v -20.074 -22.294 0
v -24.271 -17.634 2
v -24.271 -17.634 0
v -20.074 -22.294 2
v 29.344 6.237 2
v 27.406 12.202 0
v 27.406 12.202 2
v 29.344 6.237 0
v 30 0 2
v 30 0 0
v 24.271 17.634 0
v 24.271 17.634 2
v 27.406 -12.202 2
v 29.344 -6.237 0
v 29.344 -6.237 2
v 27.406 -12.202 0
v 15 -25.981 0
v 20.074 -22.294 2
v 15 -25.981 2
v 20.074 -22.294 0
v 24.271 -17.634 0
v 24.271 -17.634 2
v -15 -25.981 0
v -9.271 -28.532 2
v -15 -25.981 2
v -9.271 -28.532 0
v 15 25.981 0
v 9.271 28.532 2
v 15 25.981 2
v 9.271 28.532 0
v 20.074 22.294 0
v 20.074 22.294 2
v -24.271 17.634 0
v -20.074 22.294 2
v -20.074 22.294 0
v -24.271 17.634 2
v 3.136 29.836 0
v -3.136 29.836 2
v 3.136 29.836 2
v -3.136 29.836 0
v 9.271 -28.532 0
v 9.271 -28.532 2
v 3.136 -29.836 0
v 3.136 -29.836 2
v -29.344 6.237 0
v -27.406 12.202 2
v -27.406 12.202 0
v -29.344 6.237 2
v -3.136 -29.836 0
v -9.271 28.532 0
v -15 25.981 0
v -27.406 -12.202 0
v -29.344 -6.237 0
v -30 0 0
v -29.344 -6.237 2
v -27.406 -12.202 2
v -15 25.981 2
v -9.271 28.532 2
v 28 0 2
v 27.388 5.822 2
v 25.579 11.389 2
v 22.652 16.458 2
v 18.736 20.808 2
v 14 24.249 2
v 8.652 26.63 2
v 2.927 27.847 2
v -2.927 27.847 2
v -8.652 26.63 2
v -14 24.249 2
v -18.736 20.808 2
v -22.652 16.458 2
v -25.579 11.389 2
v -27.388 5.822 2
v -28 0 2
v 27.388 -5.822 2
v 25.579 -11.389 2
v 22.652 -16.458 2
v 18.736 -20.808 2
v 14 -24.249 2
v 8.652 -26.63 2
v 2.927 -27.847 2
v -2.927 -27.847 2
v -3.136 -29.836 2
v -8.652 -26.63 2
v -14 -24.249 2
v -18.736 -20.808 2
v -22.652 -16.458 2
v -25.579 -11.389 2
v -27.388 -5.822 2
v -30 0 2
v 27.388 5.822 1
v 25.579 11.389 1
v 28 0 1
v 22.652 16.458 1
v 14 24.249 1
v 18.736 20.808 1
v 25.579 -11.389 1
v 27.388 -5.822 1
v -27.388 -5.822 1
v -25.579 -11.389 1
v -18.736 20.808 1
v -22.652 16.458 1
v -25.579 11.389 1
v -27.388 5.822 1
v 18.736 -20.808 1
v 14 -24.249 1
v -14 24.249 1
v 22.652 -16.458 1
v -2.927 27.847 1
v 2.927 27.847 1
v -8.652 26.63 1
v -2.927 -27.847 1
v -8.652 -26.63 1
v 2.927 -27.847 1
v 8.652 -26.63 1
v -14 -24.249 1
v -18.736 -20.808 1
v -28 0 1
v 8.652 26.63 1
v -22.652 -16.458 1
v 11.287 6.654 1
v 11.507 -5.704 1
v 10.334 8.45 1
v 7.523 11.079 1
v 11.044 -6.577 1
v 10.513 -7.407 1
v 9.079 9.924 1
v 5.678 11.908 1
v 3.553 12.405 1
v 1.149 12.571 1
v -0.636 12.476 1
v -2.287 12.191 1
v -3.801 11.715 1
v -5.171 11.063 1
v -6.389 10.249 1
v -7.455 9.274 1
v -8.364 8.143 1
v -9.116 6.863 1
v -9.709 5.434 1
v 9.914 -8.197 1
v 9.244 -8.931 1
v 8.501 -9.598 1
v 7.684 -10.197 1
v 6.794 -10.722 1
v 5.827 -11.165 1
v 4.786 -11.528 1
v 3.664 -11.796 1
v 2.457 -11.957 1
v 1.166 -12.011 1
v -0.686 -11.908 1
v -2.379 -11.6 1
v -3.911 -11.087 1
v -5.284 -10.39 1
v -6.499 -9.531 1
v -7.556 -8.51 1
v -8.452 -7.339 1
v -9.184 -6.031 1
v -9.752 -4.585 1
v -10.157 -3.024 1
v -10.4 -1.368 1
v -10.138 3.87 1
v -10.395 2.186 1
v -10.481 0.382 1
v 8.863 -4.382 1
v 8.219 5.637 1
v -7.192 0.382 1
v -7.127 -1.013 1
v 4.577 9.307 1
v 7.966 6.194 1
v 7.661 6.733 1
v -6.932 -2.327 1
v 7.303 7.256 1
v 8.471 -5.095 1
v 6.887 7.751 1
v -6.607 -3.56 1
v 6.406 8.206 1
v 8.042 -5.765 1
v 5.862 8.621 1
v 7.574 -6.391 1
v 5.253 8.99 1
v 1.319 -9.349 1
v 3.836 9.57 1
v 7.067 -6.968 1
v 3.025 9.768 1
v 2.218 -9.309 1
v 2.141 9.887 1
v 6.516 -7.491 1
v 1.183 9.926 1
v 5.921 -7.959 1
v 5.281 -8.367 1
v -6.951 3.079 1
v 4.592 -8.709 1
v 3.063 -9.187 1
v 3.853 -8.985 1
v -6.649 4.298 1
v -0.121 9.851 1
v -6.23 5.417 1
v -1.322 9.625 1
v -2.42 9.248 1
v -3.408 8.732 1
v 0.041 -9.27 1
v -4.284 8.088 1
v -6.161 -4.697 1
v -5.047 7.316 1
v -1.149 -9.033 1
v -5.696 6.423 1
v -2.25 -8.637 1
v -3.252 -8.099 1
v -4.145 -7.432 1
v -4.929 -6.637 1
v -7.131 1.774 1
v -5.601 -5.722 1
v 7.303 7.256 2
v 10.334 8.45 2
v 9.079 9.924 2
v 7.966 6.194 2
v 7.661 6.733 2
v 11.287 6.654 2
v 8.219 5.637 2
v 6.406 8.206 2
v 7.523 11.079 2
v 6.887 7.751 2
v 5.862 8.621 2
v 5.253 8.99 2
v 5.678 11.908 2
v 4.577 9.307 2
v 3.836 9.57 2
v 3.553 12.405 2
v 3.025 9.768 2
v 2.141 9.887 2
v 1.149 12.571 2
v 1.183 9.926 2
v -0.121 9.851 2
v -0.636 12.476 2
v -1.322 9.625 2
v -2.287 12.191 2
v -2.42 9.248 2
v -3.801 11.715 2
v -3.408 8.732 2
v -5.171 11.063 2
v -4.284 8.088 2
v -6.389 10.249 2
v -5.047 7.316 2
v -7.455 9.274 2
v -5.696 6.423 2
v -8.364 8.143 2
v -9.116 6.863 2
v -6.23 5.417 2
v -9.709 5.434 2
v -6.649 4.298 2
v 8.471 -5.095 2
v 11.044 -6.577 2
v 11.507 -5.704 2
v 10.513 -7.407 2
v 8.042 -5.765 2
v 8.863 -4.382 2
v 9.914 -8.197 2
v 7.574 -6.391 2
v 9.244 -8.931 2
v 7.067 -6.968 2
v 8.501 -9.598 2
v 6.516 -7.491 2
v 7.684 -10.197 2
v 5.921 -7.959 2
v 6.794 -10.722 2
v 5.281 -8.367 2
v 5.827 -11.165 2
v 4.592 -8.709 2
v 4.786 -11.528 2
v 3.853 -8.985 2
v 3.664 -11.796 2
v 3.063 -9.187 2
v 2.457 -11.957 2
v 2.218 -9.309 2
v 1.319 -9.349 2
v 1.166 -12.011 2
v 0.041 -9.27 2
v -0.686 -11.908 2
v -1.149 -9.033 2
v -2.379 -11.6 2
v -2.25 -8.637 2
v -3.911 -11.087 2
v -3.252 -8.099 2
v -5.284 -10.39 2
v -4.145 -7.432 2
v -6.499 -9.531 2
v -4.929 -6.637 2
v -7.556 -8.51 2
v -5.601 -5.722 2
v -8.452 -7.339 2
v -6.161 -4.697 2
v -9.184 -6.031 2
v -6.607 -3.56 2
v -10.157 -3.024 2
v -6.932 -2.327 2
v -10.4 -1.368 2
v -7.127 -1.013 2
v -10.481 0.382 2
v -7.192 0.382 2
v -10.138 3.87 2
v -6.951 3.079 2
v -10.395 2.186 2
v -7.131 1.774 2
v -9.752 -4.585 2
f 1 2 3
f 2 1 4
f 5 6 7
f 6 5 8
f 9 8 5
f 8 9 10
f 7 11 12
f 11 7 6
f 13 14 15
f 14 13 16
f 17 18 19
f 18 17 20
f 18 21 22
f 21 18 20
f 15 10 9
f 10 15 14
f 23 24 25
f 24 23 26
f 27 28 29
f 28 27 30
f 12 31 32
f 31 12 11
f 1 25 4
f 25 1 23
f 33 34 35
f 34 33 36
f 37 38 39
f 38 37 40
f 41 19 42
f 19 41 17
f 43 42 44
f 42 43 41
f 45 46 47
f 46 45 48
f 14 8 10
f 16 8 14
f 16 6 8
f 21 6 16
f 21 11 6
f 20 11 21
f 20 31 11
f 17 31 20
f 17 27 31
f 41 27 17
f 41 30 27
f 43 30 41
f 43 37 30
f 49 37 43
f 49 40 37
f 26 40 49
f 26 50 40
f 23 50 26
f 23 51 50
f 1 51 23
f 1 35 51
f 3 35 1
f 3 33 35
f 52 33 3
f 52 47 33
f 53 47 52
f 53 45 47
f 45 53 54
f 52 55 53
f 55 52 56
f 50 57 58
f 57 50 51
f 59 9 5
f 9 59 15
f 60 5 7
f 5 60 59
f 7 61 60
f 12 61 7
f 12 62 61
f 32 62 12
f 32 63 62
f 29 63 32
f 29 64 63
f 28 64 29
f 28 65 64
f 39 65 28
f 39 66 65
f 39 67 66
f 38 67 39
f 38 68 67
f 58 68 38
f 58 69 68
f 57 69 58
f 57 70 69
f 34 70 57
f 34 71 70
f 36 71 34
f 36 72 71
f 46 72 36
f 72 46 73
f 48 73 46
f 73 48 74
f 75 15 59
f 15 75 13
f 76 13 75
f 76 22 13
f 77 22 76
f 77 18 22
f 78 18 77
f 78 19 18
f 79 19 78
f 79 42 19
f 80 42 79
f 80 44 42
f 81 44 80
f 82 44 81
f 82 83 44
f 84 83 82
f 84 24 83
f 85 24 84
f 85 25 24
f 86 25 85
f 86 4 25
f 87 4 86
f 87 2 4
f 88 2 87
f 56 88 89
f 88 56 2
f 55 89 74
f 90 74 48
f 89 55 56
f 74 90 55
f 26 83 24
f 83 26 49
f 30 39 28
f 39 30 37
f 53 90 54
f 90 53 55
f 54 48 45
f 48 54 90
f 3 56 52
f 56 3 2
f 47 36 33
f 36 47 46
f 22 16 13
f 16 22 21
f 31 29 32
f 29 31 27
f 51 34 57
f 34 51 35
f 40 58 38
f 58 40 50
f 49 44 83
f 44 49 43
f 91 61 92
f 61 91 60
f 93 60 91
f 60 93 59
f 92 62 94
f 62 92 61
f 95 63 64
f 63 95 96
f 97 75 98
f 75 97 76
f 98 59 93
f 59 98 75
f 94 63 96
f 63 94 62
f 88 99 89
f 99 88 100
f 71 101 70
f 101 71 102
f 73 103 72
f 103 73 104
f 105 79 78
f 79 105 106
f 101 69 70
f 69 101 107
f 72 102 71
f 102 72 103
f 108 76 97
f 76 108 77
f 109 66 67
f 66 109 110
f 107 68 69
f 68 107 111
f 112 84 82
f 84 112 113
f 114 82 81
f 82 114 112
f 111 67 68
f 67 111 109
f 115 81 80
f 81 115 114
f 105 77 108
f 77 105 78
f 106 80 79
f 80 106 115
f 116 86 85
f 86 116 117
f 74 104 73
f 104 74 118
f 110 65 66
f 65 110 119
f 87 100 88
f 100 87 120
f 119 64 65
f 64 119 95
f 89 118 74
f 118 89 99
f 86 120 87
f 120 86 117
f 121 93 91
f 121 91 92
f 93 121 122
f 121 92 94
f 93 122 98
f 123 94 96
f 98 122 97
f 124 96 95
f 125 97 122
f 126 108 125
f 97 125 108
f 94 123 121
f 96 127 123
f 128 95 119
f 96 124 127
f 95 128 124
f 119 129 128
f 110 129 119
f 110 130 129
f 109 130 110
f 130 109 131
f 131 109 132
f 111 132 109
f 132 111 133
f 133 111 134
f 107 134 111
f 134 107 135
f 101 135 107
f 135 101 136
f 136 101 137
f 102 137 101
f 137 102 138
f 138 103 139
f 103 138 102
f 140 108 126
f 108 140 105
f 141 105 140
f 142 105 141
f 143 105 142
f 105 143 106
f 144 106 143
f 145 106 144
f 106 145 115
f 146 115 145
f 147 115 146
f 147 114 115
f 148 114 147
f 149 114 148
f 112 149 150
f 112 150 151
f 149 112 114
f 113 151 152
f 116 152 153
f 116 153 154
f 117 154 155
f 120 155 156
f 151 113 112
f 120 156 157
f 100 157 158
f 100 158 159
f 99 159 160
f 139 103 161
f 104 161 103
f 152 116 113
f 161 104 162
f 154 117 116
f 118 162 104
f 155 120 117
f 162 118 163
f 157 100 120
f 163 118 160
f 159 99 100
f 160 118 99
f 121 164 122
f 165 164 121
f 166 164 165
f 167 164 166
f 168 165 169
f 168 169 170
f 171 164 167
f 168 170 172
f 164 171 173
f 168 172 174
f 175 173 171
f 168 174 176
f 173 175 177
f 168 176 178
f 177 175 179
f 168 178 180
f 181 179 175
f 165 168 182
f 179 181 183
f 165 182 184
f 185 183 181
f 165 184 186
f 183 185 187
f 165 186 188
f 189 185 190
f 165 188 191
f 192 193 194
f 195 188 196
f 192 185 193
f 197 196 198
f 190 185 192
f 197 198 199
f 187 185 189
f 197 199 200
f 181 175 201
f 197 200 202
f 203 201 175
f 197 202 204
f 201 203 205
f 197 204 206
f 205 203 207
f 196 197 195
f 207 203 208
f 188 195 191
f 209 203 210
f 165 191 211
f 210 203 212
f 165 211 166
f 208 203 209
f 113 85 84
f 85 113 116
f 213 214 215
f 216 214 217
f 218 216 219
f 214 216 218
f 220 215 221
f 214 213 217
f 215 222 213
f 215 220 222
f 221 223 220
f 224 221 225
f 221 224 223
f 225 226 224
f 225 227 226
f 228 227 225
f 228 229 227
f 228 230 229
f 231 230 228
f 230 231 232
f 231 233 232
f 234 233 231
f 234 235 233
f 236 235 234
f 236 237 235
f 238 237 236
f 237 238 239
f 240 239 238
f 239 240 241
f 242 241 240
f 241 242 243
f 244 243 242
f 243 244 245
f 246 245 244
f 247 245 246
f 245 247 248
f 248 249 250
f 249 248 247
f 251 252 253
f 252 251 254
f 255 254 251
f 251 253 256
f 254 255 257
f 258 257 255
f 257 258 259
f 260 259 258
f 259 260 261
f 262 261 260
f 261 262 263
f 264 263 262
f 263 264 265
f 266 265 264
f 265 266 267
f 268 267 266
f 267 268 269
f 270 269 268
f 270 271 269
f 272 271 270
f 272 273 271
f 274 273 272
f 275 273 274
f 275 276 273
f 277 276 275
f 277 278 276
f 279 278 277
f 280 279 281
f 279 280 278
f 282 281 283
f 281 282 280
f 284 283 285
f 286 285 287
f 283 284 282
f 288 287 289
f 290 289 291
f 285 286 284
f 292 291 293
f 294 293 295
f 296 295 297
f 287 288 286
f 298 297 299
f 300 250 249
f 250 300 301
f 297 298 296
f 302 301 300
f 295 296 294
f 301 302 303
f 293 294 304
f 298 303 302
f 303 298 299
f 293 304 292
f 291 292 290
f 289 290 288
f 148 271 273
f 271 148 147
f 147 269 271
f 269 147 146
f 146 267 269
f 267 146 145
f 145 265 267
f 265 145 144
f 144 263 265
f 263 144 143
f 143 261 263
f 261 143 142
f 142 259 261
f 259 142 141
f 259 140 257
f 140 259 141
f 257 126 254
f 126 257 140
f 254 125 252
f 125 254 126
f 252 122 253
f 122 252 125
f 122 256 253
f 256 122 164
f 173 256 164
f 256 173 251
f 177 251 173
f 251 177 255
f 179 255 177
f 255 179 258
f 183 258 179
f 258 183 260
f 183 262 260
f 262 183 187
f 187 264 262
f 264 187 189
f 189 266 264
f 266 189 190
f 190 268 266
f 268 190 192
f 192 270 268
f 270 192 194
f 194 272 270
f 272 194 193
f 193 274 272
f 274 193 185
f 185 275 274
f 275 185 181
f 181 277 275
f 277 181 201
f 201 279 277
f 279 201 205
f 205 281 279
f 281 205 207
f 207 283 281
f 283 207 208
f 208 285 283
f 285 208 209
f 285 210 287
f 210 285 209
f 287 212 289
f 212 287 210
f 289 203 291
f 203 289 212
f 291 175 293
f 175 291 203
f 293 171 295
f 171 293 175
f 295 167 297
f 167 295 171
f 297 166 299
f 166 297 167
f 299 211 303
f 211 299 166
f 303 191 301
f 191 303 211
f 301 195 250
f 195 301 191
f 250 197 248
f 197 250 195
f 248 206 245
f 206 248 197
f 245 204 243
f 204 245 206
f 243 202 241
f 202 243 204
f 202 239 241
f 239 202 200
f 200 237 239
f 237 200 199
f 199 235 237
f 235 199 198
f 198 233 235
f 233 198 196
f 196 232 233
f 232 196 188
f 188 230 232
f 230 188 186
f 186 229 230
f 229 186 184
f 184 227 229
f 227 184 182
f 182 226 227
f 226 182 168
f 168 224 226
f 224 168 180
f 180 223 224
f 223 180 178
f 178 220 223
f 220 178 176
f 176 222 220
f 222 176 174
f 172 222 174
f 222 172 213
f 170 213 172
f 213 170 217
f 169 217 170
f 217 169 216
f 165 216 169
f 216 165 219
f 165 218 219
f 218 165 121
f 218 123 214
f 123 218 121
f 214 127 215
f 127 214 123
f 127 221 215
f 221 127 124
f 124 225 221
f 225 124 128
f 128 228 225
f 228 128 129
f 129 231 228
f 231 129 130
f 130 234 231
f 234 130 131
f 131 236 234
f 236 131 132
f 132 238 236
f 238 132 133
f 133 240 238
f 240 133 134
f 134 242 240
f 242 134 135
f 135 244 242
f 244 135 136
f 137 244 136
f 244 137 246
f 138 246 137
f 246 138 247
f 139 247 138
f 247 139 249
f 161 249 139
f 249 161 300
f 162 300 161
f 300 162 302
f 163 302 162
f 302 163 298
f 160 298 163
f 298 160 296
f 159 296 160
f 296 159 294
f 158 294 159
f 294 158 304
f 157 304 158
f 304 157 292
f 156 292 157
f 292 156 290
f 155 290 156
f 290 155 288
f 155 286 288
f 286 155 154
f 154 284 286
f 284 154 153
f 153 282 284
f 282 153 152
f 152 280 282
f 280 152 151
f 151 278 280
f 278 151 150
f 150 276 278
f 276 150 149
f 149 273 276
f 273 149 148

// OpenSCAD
// Units are in millimeters

// Thickness (Z)
d_outer = 2.0;
d_inner = 1.0;

// Radius (XY)
r_thickness = 2.0;
r_outer = 30.0;
r_inner = r_outer - r_thickness;

// Font stuff
font = "Liberation Sans";

letter_size = 25;
letter_height = d_outer;


// Makes a letter or some shit?
module letter(l) {
	// Use linear_extrude() to make the letters 3D objects as they
	// are only 2D shapes when only using text()
	linear_extrude(height = letter_height) {
		text(l, size = letter_size, font = font, halign = "center", valign = "center", $fn = 16);
	}
}


// Make the main shape
module tag_shape() {
    difference() {
        // Outline of the tag
        cylinder(h = d_outer, r = r_outer);

        // Subtracted inner shape
        translate([0.0, 0.0, d_inner])
            cylinder(h = d_inner + d_outer, r = r_inner);
    }
}





// Make that stuff
union() {
    // The tag
    tag_shape();
    // Make that C letter!
    letter("C");
}
